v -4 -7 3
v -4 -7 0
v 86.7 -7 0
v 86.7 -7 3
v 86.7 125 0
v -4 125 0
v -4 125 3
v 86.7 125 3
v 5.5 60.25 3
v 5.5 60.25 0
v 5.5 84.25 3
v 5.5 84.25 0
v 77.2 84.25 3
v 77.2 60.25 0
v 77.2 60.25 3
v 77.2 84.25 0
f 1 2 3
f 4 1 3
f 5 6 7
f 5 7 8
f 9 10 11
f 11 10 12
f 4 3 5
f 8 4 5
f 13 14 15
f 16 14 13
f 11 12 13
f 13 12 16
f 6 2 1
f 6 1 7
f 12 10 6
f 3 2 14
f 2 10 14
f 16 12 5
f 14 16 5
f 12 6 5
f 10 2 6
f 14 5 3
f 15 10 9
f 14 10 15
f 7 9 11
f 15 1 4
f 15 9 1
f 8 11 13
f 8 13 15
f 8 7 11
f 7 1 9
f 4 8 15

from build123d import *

# Parameters (mm, degrees)
F0_W     = 90.7
F0_H     = 132
F0_W_2   = 82.7
F0_H_2   = 116
F0_W_3   = 71.7
F0_H_3   = 24
F1_DEPTH = 3


with BuildPart() as f1:
    # F0 (on Top) → F1 (new body)
    with BuildSketch(Plane.XY):
        with Locations((41.35, 59)):
            Rectangle(F0_W, F0_H)
        with Locations((41.35, 58)):
            Rectangle(F0_W_2, F0_H_2, mode=Mode.SUBTRACT)
        with Locations((41.35, 58)):
            Rectangle(F0_W_2, F0_H_2)
        with Locations((41.35, 72.25)):
            Rectangle(F0_W_3, F0_H_3, mode=Mode.SUBTRACT)
    extrude(amount=F1_DEPTH)


solid = f1.part
